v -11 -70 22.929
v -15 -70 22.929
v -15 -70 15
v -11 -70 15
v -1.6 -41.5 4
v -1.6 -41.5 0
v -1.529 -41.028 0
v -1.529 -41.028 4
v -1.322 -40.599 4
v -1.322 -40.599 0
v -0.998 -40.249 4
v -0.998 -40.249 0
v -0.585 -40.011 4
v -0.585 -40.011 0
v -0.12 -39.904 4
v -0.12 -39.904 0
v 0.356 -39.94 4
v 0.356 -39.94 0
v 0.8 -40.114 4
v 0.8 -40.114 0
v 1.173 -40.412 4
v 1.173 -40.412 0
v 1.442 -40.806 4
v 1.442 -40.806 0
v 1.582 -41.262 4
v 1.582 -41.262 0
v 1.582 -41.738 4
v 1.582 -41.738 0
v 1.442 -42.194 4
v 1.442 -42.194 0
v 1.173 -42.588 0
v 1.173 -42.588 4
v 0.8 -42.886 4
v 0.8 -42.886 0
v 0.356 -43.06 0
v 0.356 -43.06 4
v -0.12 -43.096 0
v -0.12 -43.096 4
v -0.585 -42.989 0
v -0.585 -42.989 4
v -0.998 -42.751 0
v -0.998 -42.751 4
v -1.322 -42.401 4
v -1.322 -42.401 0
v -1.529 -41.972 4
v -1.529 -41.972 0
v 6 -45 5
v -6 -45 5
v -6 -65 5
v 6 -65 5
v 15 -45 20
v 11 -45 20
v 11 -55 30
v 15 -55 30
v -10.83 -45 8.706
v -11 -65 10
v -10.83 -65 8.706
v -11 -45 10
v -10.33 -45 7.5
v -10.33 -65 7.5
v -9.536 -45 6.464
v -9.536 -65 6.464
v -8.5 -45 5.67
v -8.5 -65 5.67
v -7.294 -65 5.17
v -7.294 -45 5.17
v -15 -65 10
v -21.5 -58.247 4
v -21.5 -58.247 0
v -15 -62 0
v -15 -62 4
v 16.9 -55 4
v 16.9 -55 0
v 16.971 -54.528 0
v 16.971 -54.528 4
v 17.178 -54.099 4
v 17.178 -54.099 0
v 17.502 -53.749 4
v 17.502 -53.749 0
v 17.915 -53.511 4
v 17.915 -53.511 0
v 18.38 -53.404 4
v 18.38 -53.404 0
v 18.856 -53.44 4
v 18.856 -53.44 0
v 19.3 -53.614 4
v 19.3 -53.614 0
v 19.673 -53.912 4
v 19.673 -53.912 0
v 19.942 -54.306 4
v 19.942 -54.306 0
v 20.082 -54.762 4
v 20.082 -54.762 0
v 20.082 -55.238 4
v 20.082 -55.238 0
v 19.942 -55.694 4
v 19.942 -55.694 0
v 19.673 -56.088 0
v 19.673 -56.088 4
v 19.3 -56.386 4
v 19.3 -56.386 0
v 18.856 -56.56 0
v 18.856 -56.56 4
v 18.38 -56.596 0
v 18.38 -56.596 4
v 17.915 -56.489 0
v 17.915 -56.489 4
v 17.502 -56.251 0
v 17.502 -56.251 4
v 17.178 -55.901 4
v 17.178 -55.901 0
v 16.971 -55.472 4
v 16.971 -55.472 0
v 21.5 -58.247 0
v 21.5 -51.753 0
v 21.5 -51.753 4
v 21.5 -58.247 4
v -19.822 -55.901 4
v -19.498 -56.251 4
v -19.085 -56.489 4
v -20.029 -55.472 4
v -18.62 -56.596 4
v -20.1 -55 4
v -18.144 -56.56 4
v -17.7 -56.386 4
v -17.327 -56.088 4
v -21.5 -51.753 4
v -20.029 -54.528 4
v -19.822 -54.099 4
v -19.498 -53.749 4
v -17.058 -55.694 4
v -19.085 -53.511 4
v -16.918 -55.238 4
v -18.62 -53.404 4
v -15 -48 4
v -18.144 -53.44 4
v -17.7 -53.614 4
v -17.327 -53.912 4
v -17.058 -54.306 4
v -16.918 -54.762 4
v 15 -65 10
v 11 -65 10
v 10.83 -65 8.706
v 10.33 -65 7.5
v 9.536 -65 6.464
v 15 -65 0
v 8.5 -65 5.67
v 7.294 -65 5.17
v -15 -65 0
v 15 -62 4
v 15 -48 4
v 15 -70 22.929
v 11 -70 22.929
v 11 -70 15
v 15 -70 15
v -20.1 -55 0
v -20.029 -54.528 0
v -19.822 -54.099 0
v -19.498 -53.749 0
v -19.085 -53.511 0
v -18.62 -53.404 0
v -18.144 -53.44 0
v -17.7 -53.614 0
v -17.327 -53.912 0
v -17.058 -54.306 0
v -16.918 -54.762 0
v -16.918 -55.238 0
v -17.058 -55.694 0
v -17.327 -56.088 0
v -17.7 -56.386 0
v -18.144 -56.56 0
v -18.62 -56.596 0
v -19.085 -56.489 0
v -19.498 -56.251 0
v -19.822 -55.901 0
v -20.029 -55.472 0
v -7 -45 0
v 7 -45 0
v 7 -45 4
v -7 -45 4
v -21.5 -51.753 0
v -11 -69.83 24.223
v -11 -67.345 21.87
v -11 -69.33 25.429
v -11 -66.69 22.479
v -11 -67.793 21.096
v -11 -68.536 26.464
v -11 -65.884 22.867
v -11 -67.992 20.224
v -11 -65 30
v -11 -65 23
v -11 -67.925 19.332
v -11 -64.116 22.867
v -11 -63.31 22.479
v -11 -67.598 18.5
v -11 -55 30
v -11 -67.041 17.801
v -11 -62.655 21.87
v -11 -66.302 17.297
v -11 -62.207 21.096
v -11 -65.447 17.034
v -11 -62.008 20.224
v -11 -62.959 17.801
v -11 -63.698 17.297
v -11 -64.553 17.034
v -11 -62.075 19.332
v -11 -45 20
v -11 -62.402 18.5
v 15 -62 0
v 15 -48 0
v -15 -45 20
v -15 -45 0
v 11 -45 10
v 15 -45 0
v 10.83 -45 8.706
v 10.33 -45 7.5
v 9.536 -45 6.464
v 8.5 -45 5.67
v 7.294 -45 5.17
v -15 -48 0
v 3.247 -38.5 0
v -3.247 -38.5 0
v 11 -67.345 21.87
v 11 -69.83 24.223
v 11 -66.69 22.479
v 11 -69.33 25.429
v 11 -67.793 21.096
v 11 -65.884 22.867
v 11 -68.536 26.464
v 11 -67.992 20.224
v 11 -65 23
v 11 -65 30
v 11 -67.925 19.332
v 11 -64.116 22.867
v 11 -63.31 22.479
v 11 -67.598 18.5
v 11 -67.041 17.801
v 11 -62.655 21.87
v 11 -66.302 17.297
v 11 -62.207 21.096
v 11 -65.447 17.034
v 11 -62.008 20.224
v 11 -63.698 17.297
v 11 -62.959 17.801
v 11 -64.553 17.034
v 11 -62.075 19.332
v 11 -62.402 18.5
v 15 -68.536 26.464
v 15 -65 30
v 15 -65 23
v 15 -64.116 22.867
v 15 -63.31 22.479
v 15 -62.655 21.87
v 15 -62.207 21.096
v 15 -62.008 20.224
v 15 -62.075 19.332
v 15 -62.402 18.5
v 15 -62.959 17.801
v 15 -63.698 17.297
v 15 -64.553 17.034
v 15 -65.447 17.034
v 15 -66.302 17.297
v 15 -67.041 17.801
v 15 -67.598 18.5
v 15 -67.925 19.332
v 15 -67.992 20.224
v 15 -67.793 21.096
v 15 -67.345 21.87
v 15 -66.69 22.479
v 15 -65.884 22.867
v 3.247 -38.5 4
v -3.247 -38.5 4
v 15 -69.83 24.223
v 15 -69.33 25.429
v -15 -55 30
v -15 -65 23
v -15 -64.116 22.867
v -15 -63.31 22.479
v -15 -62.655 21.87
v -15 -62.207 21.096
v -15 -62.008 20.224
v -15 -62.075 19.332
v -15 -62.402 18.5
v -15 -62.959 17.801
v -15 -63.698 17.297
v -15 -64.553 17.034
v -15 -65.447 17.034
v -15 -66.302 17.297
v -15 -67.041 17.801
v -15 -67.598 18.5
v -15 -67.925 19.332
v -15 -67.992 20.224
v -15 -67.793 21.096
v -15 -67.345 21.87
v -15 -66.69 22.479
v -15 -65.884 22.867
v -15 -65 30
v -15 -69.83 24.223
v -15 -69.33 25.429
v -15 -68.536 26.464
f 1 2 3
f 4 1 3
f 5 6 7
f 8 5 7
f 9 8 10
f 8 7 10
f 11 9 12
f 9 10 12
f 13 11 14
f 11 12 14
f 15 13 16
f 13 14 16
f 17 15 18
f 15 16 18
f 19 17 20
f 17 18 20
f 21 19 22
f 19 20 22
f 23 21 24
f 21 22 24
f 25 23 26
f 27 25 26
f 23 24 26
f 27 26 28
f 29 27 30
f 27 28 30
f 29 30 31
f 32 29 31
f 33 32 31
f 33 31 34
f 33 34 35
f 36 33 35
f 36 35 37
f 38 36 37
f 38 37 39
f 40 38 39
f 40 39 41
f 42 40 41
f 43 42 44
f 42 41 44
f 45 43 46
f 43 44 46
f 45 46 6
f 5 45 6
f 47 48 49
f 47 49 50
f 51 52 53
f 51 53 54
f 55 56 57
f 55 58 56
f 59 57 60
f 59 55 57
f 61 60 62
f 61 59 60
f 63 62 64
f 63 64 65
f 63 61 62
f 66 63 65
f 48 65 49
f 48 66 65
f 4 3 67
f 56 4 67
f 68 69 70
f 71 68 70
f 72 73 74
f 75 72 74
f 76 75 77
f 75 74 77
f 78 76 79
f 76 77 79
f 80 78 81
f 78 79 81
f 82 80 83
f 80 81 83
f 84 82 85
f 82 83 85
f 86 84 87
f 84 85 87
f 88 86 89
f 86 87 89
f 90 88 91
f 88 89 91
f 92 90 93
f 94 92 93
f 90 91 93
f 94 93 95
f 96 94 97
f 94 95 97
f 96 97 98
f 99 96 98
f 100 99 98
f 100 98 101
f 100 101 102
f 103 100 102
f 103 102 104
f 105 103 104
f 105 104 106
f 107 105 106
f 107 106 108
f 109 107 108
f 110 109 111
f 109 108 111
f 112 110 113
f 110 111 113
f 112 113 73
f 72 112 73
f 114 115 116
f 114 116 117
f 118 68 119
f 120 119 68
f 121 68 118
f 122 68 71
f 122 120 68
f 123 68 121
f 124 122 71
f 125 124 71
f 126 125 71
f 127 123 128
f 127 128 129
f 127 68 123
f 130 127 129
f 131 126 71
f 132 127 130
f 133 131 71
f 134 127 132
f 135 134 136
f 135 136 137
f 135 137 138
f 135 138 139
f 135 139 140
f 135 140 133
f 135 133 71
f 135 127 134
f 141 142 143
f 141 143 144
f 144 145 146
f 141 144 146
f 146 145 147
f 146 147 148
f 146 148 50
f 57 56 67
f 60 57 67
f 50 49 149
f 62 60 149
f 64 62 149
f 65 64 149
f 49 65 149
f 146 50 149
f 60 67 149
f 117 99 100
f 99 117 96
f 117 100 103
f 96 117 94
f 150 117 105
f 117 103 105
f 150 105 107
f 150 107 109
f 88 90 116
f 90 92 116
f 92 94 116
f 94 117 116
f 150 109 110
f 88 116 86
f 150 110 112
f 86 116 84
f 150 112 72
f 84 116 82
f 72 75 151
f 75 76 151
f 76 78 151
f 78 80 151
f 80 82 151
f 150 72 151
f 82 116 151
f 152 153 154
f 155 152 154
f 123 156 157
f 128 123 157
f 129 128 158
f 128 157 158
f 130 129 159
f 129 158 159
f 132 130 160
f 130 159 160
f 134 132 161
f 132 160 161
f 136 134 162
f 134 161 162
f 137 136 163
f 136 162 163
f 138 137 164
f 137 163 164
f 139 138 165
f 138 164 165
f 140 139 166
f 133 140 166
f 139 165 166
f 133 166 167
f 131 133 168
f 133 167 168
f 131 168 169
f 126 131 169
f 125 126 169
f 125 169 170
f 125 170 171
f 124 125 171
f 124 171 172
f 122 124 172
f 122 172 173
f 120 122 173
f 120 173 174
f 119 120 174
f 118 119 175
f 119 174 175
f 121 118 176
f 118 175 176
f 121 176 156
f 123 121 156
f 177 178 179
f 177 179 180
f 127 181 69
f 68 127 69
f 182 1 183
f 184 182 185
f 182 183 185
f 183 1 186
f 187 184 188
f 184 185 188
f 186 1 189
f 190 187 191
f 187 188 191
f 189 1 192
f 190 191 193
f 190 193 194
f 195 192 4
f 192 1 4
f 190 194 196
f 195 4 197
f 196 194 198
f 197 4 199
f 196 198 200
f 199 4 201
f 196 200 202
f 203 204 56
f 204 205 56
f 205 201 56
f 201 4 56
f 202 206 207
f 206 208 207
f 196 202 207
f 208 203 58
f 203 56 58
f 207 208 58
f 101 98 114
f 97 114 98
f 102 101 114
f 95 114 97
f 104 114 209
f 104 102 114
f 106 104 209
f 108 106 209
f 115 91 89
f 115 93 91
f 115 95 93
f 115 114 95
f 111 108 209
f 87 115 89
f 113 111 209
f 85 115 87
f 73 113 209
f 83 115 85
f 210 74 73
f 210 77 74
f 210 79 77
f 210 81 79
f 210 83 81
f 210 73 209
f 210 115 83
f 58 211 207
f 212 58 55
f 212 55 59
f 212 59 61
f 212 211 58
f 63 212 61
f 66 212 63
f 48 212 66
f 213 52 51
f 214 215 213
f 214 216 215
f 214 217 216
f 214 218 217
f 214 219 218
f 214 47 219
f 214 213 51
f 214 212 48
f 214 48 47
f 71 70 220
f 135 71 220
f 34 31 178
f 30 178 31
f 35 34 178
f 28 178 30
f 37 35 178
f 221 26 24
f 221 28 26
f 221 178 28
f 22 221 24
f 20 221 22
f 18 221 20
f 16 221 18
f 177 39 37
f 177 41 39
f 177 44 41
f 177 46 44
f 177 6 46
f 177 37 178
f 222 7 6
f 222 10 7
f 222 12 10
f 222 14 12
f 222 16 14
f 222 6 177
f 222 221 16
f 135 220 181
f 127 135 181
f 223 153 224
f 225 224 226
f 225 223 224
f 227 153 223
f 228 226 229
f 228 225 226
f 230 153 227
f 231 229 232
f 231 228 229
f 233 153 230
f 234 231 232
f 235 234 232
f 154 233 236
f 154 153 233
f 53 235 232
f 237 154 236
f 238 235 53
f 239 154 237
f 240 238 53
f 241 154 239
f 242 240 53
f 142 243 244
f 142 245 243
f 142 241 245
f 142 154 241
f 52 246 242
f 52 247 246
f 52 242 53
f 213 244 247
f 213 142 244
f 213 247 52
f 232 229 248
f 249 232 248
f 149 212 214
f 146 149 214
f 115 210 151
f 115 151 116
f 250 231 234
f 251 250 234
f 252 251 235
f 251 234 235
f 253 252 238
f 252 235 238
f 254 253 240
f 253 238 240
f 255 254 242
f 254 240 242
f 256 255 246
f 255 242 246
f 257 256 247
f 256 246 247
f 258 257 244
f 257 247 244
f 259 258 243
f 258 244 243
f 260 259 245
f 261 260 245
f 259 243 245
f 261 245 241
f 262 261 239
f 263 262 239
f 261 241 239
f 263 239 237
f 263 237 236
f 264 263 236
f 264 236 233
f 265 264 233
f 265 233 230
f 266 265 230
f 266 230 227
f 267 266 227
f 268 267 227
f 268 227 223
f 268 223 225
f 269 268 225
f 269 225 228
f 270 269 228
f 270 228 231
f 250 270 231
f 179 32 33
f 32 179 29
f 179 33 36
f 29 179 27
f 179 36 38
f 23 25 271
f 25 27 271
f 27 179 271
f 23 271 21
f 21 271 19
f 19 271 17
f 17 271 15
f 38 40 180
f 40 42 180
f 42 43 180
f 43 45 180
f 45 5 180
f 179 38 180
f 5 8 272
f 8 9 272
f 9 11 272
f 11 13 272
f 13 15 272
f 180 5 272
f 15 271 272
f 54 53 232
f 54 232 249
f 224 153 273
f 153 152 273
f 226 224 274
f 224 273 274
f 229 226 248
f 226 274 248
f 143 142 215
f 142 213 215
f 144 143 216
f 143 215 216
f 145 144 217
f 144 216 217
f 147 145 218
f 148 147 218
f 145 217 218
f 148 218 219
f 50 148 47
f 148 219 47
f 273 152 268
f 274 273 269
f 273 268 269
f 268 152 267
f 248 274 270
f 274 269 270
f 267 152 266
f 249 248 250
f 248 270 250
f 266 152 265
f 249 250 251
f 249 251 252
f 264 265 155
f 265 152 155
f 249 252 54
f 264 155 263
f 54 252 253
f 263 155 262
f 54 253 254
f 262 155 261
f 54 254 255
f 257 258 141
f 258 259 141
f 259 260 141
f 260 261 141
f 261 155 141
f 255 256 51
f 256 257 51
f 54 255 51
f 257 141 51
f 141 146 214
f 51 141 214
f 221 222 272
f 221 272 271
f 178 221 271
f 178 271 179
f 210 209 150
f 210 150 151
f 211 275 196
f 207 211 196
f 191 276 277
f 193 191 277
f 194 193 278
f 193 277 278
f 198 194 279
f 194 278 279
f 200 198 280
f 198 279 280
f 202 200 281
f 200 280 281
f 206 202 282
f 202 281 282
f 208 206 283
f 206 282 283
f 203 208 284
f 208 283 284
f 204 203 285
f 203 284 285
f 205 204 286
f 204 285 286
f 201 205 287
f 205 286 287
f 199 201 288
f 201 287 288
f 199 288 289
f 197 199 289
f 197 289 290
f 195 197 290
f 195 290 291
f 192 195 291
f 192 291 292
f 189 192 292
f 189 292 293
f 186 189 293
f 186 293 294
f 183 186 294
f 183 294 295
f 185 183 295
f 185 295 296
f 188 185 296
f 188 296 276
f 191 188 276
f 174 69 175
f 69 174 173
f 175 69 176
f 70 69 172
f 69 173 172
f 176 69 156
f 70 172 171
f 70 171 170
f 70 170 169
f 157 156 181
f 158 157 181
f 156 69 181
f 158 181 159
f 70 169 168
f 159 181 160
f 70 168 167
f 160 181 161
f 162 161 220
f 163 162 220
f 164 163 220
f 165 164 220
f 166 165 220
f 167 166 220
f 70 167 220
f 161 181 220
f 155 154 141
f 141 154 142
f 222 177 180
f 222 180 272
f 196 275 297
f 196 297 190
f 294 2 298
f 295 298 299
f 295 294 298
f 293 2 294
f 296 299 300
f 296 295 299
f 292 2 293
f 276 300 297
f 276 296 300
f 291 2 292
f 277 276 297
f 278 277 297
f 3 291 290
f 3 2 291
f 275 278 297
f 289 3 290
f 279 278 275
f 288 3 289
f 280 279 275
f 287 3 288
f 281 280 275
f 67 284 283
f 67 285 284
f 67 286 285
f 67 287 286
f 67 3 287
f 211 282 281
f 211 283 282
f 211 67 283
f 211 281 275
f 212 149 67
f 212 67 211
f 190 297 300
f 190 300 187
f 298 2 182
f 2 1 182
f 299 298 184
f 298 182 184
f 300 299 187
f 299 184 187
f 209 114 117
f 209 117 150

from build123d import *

# Parameters (mm, degrees)
SKETCH1_W             = 30
SKETCH1_H             = 40
BOSS_EXTRUDE1_DEPTH   = 5
SKETCH2_W             = 4
SKETCH2_H             = 40
BOSS_EXTRUDE2_DEPTH   = 25
CHAMFER1_SIZE         = 10
SKETCH3_R             = 3
CUT_EXTRUDE1_DEPTH    = 76
CUT_EXTRUDE2_DEPTH    = 76
CHAMFER2_SIZE         = 5
FILLET1_R             = 5
FILLET2_R             = 5
SKETCH5_R             = 1.6
BOSS_EXTRUDE3_DEPTH   = 4
BOSS_EXTRUDE3_2_DEPTH = 4
BOSS_EXTRUDE3_3_DEPTH = 4


with BuildPart() as part:
    # Sketch1 → Boss-Extrude1 (new body)
    with BuildSketch(Plane.XY):
        with Locations((0, -65)):
            Rectangle(SKETCH1_W, SKETCH1_H)
    extrude(amount=BOSS_EXTRUDE1_DEPTH)

    # Sketch2 → Boss-Extrude2 (add)
    with BuildSketch(Plane.XY.offset(5)):
        with Locations((-13, -65)):
            Rectangle(SKETCH2_W, SKETCH2_H)
        with Locations((13, -65)):
            Rectangle(SKETCH2_W, SKETCH2_H)
    extrude(amount=BOSS_EXTRUDE2_DEPTH)

    # Chamfer1
    chamfer1_edges = [part.edges().sort_by_distance(p)[0] for p in [
        (-13, -85, 30),
        (-13, -45, 30),
        (13, -45, 30),
        (13, -85, 30),
    ]]
    chamfer(chamfer1_edges, length=CHAMFER1_SIZE)

    # Sketch3 → Cut-Extrude1 (cut)
    with BuildSketch(Plane.ZY.offset(15)):
        with Locations((20, -65)):
            Circle(SKETCH3_R)
    extrude(amount=-CUT_EXTRUDE1_DEPTH, mode=Mode.SUBTRACT)

    # Sketch4 → Cut-Extrude2 (cut)
    with BuildSketch(Plane.ZY.offset(15)):
        Polygon((30, -70), (15, -70), (10, -65), (0, -65), (-4.906165795, -89.804855258), (31.217938956, -87.25505427), align=None)
    extrude(amount=-CUT_EXTRUDE2_DEPTH, mode=Mode.SUBTRACT)

    # Chamfer2
    chamfer2_edges = [part.edges().sort_by_distance(p)[0] for p in [
        (13, -70, 30),
        (-13, -70, 30),
    ]]
    chamfer(chamfer2_edges, length=CHAMFER2_SIZE)

    # Fillet1
    fillet1_edges = [part.edges().sort_by_distance(p)[0] for p in [
        (11, -55, 5),
        (-11, -55, 5),
    ]]
    fillet(fillet1_edges, radius=FILLET1_R)

    # Fillet2
    fillet2_edges = [part.edges().sort_by_distance(p)[0] for p in [
        (-13, -70, 25),
        (13, -70, 25),
    ]]
    fillet(fillet2_edges, radius=FILLET2_R)


with BuildPart() as body_2:
    # Sketch5 → Boss-Extrude3 (new body)
    with BuildSketch(Plane(origin=(0, 0, 0), x_dir=(-1, 0, 0), z_dir=(0, 0, -1))):
        Polygon((7, -45), (3.24722325, -38.5), (-3.24722325, -38.5), (-7, -45), align=None)
        with Locations((0, -41.5)):
            Circle(SKETCH5_R, mode=Mode.SUBTRACT)
    extrude(amount=-BOSS_EXTRUDE3_DEPTH)


with BuildPart() as body_3:
    # Sketch5 → Boss-Extrude3 2 (new body)
    with BuildSketch(Plane(origin=(0, 0, 0), x_dir=(-1, 0, 0), z_dir=(0, 0, -1))):
        Polygon((15, -48), (21.5, -51.75277675), (21.5, -58.24722325), (15, -62), align=None)
        with Locations((18.5, -55)):
            Circle(SKETCH5_R, mode=Mode.SUBTRACT)
    extrude(amount=-BOSS_EXTRUDE3_2_DEPTH)


with BuildPart() as body_4:
    # Sketch5 → Boss-Extrude3 3 (new body)
    with BuildSketch(Plane(origin=(0, 0, 0), x_dir=(-1, 0, 0), z_dir=(0, 0, -1))):
        Polygon((-15, -62), (-15, -48), (-21.5, -51.75277675), (-21.5, -58.24722325), align=None)
        with Locations((-18.5, -55)):
            Circle(SKETCH5_R, mode=Mode.SUBTRACT)
    extrude(amount=-BOSS_EXTRUDE3_3_DEPTH)


solid = Compound([part.part, body_2.part, body_3.part, body_4.part])
